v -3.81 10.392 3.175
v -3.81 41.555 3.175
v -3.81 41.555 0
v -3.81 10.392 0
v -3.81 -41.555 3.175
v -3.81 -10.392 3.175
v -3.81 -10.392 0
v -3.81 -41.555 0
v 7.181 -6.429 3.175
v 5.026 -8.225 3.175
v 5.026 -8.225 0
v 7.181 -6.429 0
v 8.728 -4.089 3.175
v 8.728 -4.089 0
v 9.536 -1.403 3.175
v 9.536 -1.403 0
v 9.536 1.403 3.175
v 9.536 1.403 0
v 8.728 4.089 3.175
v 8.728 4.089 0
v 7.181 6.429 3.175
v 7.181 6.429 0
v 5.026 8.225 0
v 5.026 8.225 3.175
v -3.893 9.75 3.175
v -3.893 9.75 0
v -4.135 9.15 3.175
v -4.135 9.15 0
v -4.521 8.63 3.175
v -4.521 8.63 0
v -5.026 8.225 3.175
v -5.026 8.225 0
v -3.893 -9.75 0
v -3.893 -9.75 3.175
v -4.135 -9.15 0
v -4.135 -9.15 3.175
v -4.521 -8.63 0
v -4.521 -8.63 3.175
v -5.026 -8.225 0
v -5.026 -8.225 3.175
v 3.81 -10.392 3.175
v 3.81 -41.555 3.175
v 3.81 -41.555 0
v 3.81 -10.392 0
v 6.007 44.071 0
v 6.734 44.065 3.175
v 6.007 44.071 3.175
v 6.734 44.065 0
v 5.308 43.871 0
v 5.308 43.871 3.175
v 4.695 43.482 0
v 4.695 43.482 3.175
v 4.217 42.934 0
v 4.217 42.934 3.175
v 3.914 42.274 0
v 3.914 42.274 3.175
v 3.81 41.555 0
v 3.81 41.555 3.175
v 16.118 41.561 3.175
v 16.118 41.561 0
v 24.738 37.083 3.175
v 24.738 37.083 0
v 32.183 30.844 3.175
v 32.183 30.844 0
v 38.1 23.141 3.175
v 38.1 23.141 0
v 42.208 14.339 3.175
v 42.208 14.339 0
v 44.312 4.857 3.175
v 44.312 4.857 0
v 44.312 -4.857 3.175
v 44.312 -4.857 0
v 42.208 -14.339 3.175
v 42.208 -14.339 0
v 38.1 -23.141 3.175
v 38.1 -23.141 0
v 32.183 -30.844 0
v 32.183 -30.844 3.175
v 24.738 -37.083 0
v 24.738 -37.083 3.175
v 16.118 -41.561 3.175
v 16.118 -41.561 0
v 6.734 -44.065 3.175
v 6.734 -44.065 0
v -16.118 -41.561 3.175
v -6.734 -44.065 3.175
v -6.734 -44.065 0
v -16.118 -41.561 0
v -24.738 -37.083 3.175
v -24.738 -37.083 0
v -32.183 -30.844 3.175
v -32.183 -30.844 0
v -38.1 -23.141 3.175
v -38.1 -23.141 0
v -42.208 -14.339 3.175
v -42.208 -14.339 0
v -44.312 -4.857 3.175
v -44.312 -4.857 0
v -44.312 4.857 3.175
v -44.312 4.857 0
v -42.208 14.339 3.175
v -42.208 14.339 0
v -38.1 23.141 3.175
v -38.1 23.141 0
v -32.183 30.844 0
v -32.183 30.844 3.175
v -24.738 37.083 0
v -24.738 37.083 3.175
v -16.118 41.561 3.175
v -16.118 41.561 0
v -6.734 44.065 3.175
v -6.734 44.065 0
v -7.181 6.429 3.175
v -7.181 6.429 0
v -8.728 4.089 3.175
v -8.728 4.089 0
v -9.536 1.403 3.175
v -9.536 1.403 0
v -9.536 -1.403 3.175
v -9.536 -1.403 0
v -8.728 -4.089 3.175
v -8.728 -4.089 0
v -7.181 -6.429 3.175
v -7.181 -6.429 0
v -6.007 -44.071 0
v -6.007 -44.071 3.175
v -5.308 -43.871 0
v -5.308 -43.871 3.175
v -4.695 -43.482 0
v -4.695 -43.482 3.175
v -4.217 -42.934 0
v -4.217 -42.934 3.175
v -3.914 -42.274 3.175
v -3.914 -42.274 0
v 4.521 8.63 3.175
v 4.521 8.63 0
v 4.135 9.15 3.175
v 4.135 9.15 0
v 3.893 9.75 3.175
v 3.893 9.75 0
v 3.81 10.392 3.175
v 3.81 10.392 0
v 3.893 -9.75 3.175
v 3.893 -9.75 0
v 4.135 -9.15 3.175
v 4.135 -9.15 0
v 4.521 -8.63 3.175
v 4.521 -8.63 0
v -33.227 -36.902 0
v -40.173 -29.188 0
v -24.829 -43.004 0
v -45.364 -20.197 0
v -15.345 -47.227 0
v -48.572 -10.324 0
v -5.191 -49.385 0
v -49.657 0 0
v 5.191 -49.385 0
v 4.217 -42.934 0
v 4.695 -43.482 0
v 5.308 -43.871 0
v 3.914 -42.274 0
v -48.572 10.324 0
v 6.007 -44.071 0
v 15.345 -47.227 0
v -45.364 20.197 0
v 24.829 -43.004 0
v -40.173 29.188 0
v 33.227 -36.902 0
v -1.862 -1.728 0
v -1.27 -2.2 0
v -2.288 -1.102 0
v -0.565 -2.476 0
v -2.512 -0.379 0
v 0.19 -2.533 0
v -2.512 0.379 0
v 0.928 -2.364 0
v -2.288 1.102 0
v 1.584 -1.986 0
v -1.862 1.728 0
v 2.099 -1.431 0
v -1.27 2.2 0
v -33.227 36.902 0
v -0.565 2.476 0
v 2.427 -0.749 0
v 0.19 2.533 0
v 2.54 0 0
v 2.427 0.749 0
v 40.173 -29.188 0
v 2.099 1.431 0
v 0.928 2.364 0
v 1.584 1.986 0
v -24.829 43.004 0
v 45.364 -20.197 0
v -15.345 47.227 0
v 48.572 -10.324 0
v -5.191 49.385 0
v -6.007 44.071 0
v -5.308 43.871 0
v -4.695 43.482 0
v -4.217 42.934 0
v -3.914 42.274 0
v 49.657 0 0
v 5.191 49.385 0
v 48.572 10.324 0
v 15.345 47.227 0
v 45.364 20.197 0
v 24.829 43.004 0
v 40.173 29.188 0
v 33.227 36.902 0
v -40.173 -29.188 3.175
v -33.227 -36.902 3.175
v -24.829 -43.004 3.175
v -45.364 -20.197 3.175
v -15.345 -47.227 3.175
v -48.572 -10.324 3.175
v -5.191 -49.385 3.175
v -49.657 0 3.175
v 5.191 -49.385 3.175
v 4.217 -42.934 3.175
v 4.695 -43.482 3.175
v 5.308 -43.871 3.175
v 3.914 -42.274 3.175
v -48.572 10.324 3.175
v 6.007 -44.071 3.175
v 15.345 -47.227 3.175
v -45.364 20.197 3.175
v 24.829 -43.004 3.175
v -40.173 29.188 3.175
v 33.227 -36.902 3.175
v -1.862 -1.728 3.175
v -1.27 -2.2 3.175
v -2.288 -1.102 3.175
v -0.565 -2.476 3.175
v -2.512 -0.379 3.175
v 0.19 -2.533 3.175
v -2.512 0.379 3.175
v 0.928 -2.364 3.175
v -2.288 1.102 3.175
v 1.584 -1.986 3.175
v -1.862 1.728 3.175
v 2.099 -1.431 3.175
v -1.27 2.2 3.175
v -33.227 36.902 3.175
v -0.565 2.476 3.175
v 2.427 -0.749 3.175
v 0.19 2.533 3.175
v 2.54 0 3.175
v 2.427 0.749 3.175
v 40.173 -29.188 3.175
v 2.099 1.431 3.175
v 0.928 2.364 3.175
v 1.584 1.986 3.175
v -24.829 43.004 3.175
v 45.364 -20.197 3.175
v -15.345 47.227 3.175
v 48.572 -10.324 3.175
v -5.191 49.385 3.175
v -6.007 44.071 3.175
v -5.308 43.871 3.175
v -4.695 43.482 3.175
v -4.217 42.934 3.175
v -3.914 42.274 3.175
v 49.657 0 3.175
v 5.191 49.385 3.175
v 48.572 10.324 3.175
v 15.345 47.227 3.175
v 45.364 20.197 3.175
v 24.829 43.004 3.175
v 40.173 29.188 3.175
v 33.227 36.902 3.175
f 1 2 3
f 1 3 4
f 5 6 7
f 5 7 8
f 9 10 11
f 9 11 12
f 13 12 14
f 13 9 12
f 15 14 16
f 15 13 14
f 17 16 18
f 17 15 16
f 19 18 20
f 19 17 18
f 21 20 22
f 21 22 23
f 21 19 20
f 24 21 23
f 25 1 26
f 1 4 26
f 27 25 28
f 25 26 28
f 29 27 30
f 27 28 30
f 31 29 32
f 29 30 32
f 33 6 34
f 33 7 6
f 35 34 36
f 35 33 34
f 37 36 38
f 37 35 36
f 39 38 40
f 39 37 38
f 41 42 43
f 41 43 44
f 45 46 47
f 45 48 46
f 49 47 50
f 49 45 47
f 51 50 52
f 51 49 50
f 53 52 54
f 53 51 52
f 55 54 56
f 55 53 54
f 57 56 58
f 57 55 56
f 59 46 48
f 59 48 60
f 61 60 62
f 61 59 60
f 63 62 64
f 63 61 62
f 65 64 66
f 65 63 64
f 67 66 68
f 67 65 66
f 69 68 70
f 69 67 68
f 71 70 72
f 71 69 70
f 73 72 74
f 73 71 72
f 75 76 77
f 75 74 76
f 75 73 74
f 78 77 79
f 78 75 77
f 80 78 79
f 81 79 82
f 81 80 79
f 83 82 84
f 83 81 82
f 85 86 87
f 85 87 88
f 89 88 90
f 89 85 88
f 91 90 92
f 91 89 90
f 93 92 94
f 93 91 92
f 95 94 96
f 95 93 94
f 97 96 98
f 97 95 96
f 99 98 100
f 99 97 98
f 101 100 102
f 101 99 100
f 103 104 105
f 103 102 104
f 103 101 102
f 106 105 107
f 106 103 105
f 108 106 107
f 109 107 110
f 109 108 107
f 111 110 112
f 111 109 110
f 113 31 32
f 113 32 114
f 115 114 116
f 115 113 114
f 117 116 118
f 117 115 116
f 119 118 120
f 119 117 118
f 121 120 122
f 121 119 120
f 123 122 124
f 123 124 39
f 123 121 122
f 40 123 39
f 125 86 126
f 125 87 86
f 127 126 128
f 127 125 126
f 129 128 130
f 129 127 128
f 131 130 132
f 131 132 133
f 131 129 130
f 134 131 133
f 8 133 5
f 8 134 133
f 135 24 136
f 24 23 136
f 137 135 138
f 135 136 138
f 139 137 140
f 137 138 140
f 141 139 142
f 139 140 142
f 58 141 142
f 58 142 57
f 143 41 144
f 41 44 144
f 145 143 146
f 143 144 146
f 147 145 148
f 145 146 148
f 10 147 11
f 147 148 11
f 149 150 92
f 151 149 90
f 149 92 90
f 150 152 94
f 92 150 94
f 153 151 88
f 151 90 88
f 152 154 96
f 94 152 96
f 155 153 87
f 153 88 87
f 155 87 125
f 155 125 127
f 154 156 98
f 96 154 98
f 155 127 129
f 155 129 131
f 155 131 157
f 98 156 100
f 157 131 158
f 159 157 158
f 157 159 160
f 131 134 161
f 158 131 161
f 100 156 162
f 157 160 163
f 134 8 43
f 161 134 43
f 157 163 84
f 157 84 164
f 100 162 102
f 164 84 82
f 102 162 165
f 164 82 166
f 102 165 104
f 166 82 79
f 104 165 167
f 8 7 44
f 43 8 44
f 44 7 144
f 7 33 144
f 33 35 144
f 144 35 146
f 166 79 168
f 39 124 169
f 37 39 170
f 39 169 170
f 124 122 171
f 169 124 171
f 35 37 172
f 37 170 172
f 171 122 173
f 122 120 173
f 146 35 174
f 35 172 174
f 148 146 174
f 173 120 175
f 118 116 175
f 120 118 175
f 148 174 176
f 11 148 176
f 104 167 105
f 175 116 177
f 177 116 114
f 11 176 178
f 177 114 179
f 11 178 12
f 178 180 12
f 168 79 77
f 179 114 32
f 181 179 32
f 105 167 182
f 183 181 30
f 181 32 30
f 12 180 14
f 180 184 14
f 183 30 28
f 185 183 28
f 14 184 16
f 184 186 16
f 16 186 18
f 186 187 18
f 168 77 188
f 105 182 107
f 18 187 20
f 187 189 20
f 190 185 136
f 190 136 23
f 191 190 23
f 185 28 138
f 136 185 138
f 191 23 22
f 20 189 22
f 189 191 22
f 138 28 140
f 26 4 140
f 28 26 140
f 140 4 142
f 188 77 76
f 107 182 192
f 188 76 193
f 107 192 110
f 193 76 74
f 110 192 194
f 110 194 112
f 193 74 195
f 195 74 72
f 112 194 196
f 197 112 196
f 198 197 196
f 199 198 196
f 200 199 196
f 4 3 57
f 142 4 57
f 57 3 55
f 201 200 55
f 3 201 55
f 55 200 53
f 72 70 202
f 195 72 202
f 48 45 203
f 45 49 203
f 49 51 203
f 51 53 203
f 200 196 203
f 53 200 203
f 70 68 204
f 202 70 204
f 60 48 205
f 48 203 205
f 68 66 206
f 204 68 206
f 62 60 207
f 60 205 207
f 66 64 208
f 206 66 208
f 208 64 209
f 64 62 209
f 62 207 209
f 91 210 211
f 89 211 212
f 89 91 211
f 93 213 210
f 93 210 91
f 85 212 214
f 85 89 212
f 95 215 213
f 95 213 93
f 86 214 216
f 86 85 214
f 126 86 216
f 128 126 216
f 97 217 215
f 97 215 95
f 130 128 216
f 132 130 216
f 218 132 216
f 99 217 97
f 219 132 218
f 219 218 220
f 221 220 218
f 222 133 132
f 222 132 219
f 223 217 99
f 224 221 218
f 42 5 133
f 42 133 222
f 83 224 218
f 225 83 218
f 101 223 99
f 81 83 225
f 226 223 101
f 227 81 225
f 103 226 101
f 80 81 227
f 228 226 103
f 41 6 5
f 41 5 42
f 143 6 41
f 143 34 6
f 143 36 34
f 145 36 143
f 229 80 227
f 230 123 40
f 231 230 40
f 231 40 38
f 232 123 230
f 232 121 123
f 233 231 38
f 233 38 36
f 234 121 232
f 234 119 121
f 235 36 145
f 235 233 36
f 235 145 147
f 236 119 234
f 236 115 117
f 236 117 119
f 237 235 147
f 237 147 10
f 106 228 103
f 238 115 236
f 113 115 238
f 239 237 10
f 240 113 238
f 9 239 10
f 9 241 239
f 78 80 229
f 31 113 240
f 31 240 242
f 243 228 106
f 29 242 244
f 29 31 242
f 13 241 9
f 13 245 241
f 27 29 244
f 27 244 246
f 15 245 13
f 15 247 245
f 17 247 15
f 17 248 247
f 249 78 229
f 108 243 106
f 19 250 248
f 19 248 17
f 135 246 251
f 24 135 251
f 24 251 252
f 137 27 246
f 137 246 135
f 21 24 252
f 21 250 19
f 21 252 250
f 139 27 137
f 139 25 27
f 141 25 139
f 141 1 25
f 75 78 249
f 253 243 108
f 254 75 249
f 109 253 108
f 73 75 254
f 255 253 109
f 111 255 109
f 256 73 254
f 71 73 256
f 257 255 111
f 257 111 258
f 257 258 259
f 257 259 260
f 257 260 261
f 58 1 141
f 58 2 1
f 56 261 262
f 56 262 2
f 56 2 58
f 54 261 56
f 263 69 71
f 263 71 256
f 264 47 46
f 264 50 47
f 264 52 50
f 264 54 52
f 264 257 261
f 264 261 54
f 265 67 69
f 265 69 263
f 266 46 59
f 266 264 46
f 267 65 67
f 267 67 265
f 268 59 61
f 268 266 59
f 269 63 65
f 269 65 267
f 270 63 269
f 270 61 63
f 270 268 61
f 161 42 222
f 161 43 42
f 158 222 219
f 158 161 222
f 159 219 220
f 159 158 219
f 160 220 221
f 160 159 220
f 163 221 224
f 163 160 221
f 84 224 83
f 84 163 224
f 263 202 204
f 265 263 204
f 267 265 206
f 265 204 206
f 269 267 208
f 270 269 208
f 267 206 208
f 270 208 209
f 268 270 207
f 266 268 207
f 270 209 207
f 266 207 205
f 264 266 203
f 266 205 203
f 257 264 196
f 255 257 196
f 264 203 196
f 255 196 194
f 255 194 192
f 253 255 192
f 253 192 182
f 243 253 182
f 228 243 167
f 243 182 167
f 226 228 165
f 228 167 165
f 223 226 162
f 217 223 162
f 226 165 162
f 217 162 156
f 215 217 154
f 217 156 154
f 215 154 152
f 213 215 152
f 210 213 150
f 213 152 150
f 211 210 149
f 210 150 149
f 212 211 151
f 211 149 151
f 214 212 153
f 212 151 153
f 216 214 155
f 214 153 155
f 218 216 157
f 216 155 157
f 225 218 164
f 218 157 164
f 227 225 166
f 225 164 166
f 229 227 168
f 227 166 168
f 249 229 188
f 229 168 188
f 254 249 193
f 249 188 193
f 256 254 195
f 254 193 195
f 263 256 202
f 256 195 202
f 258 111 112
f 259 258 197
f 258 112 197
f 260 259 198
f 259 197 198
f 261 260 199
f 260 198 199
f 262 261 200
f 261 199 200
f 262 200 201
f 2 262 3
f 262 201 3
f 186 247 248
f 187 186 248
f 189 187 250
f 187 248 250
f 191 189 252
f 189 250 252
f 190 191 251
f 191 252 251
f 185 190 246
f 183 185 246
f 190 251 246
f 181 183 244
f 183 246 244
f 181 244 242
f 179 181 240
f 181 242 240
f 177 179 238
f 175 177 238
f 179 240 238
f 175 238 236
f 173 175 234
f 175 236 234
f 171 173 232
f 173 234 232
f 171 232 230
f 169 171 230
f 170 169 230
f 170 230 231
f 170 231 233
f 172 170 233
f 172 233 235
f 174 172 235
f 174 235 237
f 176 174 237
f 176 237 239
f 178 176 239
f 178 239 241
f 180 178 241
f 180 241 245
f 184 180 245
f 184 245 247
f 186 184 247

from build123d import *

# Parameters (mm, degrees)
SKETCH1_R           = 49.657
BOSS_EXTRUDE1_DEPTH = 3.175
CUT_EXTRUDE1_DEPTH  = 71.297339374
FILLET1_R           = 2.54
FILLET2_R           = 2.54
SKETCH4_R           = 2.54
CUT_EXTRUDE2_DEPTH  = 71.297339374


with BuildPart() as part:
    # Sketch1 → Boss-Extrude1 (new body)
    with BuildSketch(Plane.XY):
        Circle(SKETCH1_R)
    extrude(amount=BOSS_EXTRUDE1_DEPTH)

    # Sketch3 → Cut-Extrude1 (cut, through all)
    with BuildSketch(Plane.XY.offset(3.175)):
        with BuildLine():
            Line((-3.81, 44.41388104), (-3.81, 8.85388104))
            ThreePointArc((-3.81, 8.85388104), (-9.638843783, 0), (-3.81, -8.85388104))
            Line((-3.81, -8.85388104), (-3.81, -44.41388104))
            ThreePointArc((-3.81, -44.41388104), (-44.577, 0), (-3.81, 44.41388104))
        make_face()
        with BuildLine():
            Line((3.81, 8.85388104), (3.81, 44.41388104))
            ThreePointArc((3.81, 44.41388104), (44.577, 0), (3.81, -44.41388104))
            Line((3.81, -44.41388104), (3.81, -8.85388104))
            ThreePointArc((3.81, -8.85388104), (9.638843783, 0), (3.81, 8.85388104))
        make_face()
    extrude(amount=-CUT_EXTRUDE1_DEPTH, mode=Mode.SUBTRACT)

    # Fillet1
    fillet1_edges = [part.edges().sort_by_distance(p)[0] for p in [
        (-3.81, -44.41388104, 1.5875),
        (-3.81, 44.41388104, 1.5875),
        (3.81, 44.41388104, 1.5875),
        (3.81, -44.41388104, 1.5875),
    ]]
    fillet(fillet1_edges, radius=FILLET1_R)

    # Fillet2
    fillet2_edges = [part.edges().sort_by_distance(p)[0] for p in [
        (-3.81, 8.85388104, 1.5875),
        (-3.81, -8.85388104, 1.5875),
        (3.81, -8.85388104, 1.5875),
        (3.81, 8.85388104, 1.5875),
    ]]
    fillet(fillet2_edges, radius=FILLET2_R)

    # Sketch4 → Cut-Extrude2 (cut, through all)
    with BuildSketch(Plane.XY.offset(3.175)):
        Circle(SKETCH4_R)
    extrude(amount=-CUT_EXTRUDE2_DEPTH, mode=Mode.SUBTRACT)


solid = part.part
